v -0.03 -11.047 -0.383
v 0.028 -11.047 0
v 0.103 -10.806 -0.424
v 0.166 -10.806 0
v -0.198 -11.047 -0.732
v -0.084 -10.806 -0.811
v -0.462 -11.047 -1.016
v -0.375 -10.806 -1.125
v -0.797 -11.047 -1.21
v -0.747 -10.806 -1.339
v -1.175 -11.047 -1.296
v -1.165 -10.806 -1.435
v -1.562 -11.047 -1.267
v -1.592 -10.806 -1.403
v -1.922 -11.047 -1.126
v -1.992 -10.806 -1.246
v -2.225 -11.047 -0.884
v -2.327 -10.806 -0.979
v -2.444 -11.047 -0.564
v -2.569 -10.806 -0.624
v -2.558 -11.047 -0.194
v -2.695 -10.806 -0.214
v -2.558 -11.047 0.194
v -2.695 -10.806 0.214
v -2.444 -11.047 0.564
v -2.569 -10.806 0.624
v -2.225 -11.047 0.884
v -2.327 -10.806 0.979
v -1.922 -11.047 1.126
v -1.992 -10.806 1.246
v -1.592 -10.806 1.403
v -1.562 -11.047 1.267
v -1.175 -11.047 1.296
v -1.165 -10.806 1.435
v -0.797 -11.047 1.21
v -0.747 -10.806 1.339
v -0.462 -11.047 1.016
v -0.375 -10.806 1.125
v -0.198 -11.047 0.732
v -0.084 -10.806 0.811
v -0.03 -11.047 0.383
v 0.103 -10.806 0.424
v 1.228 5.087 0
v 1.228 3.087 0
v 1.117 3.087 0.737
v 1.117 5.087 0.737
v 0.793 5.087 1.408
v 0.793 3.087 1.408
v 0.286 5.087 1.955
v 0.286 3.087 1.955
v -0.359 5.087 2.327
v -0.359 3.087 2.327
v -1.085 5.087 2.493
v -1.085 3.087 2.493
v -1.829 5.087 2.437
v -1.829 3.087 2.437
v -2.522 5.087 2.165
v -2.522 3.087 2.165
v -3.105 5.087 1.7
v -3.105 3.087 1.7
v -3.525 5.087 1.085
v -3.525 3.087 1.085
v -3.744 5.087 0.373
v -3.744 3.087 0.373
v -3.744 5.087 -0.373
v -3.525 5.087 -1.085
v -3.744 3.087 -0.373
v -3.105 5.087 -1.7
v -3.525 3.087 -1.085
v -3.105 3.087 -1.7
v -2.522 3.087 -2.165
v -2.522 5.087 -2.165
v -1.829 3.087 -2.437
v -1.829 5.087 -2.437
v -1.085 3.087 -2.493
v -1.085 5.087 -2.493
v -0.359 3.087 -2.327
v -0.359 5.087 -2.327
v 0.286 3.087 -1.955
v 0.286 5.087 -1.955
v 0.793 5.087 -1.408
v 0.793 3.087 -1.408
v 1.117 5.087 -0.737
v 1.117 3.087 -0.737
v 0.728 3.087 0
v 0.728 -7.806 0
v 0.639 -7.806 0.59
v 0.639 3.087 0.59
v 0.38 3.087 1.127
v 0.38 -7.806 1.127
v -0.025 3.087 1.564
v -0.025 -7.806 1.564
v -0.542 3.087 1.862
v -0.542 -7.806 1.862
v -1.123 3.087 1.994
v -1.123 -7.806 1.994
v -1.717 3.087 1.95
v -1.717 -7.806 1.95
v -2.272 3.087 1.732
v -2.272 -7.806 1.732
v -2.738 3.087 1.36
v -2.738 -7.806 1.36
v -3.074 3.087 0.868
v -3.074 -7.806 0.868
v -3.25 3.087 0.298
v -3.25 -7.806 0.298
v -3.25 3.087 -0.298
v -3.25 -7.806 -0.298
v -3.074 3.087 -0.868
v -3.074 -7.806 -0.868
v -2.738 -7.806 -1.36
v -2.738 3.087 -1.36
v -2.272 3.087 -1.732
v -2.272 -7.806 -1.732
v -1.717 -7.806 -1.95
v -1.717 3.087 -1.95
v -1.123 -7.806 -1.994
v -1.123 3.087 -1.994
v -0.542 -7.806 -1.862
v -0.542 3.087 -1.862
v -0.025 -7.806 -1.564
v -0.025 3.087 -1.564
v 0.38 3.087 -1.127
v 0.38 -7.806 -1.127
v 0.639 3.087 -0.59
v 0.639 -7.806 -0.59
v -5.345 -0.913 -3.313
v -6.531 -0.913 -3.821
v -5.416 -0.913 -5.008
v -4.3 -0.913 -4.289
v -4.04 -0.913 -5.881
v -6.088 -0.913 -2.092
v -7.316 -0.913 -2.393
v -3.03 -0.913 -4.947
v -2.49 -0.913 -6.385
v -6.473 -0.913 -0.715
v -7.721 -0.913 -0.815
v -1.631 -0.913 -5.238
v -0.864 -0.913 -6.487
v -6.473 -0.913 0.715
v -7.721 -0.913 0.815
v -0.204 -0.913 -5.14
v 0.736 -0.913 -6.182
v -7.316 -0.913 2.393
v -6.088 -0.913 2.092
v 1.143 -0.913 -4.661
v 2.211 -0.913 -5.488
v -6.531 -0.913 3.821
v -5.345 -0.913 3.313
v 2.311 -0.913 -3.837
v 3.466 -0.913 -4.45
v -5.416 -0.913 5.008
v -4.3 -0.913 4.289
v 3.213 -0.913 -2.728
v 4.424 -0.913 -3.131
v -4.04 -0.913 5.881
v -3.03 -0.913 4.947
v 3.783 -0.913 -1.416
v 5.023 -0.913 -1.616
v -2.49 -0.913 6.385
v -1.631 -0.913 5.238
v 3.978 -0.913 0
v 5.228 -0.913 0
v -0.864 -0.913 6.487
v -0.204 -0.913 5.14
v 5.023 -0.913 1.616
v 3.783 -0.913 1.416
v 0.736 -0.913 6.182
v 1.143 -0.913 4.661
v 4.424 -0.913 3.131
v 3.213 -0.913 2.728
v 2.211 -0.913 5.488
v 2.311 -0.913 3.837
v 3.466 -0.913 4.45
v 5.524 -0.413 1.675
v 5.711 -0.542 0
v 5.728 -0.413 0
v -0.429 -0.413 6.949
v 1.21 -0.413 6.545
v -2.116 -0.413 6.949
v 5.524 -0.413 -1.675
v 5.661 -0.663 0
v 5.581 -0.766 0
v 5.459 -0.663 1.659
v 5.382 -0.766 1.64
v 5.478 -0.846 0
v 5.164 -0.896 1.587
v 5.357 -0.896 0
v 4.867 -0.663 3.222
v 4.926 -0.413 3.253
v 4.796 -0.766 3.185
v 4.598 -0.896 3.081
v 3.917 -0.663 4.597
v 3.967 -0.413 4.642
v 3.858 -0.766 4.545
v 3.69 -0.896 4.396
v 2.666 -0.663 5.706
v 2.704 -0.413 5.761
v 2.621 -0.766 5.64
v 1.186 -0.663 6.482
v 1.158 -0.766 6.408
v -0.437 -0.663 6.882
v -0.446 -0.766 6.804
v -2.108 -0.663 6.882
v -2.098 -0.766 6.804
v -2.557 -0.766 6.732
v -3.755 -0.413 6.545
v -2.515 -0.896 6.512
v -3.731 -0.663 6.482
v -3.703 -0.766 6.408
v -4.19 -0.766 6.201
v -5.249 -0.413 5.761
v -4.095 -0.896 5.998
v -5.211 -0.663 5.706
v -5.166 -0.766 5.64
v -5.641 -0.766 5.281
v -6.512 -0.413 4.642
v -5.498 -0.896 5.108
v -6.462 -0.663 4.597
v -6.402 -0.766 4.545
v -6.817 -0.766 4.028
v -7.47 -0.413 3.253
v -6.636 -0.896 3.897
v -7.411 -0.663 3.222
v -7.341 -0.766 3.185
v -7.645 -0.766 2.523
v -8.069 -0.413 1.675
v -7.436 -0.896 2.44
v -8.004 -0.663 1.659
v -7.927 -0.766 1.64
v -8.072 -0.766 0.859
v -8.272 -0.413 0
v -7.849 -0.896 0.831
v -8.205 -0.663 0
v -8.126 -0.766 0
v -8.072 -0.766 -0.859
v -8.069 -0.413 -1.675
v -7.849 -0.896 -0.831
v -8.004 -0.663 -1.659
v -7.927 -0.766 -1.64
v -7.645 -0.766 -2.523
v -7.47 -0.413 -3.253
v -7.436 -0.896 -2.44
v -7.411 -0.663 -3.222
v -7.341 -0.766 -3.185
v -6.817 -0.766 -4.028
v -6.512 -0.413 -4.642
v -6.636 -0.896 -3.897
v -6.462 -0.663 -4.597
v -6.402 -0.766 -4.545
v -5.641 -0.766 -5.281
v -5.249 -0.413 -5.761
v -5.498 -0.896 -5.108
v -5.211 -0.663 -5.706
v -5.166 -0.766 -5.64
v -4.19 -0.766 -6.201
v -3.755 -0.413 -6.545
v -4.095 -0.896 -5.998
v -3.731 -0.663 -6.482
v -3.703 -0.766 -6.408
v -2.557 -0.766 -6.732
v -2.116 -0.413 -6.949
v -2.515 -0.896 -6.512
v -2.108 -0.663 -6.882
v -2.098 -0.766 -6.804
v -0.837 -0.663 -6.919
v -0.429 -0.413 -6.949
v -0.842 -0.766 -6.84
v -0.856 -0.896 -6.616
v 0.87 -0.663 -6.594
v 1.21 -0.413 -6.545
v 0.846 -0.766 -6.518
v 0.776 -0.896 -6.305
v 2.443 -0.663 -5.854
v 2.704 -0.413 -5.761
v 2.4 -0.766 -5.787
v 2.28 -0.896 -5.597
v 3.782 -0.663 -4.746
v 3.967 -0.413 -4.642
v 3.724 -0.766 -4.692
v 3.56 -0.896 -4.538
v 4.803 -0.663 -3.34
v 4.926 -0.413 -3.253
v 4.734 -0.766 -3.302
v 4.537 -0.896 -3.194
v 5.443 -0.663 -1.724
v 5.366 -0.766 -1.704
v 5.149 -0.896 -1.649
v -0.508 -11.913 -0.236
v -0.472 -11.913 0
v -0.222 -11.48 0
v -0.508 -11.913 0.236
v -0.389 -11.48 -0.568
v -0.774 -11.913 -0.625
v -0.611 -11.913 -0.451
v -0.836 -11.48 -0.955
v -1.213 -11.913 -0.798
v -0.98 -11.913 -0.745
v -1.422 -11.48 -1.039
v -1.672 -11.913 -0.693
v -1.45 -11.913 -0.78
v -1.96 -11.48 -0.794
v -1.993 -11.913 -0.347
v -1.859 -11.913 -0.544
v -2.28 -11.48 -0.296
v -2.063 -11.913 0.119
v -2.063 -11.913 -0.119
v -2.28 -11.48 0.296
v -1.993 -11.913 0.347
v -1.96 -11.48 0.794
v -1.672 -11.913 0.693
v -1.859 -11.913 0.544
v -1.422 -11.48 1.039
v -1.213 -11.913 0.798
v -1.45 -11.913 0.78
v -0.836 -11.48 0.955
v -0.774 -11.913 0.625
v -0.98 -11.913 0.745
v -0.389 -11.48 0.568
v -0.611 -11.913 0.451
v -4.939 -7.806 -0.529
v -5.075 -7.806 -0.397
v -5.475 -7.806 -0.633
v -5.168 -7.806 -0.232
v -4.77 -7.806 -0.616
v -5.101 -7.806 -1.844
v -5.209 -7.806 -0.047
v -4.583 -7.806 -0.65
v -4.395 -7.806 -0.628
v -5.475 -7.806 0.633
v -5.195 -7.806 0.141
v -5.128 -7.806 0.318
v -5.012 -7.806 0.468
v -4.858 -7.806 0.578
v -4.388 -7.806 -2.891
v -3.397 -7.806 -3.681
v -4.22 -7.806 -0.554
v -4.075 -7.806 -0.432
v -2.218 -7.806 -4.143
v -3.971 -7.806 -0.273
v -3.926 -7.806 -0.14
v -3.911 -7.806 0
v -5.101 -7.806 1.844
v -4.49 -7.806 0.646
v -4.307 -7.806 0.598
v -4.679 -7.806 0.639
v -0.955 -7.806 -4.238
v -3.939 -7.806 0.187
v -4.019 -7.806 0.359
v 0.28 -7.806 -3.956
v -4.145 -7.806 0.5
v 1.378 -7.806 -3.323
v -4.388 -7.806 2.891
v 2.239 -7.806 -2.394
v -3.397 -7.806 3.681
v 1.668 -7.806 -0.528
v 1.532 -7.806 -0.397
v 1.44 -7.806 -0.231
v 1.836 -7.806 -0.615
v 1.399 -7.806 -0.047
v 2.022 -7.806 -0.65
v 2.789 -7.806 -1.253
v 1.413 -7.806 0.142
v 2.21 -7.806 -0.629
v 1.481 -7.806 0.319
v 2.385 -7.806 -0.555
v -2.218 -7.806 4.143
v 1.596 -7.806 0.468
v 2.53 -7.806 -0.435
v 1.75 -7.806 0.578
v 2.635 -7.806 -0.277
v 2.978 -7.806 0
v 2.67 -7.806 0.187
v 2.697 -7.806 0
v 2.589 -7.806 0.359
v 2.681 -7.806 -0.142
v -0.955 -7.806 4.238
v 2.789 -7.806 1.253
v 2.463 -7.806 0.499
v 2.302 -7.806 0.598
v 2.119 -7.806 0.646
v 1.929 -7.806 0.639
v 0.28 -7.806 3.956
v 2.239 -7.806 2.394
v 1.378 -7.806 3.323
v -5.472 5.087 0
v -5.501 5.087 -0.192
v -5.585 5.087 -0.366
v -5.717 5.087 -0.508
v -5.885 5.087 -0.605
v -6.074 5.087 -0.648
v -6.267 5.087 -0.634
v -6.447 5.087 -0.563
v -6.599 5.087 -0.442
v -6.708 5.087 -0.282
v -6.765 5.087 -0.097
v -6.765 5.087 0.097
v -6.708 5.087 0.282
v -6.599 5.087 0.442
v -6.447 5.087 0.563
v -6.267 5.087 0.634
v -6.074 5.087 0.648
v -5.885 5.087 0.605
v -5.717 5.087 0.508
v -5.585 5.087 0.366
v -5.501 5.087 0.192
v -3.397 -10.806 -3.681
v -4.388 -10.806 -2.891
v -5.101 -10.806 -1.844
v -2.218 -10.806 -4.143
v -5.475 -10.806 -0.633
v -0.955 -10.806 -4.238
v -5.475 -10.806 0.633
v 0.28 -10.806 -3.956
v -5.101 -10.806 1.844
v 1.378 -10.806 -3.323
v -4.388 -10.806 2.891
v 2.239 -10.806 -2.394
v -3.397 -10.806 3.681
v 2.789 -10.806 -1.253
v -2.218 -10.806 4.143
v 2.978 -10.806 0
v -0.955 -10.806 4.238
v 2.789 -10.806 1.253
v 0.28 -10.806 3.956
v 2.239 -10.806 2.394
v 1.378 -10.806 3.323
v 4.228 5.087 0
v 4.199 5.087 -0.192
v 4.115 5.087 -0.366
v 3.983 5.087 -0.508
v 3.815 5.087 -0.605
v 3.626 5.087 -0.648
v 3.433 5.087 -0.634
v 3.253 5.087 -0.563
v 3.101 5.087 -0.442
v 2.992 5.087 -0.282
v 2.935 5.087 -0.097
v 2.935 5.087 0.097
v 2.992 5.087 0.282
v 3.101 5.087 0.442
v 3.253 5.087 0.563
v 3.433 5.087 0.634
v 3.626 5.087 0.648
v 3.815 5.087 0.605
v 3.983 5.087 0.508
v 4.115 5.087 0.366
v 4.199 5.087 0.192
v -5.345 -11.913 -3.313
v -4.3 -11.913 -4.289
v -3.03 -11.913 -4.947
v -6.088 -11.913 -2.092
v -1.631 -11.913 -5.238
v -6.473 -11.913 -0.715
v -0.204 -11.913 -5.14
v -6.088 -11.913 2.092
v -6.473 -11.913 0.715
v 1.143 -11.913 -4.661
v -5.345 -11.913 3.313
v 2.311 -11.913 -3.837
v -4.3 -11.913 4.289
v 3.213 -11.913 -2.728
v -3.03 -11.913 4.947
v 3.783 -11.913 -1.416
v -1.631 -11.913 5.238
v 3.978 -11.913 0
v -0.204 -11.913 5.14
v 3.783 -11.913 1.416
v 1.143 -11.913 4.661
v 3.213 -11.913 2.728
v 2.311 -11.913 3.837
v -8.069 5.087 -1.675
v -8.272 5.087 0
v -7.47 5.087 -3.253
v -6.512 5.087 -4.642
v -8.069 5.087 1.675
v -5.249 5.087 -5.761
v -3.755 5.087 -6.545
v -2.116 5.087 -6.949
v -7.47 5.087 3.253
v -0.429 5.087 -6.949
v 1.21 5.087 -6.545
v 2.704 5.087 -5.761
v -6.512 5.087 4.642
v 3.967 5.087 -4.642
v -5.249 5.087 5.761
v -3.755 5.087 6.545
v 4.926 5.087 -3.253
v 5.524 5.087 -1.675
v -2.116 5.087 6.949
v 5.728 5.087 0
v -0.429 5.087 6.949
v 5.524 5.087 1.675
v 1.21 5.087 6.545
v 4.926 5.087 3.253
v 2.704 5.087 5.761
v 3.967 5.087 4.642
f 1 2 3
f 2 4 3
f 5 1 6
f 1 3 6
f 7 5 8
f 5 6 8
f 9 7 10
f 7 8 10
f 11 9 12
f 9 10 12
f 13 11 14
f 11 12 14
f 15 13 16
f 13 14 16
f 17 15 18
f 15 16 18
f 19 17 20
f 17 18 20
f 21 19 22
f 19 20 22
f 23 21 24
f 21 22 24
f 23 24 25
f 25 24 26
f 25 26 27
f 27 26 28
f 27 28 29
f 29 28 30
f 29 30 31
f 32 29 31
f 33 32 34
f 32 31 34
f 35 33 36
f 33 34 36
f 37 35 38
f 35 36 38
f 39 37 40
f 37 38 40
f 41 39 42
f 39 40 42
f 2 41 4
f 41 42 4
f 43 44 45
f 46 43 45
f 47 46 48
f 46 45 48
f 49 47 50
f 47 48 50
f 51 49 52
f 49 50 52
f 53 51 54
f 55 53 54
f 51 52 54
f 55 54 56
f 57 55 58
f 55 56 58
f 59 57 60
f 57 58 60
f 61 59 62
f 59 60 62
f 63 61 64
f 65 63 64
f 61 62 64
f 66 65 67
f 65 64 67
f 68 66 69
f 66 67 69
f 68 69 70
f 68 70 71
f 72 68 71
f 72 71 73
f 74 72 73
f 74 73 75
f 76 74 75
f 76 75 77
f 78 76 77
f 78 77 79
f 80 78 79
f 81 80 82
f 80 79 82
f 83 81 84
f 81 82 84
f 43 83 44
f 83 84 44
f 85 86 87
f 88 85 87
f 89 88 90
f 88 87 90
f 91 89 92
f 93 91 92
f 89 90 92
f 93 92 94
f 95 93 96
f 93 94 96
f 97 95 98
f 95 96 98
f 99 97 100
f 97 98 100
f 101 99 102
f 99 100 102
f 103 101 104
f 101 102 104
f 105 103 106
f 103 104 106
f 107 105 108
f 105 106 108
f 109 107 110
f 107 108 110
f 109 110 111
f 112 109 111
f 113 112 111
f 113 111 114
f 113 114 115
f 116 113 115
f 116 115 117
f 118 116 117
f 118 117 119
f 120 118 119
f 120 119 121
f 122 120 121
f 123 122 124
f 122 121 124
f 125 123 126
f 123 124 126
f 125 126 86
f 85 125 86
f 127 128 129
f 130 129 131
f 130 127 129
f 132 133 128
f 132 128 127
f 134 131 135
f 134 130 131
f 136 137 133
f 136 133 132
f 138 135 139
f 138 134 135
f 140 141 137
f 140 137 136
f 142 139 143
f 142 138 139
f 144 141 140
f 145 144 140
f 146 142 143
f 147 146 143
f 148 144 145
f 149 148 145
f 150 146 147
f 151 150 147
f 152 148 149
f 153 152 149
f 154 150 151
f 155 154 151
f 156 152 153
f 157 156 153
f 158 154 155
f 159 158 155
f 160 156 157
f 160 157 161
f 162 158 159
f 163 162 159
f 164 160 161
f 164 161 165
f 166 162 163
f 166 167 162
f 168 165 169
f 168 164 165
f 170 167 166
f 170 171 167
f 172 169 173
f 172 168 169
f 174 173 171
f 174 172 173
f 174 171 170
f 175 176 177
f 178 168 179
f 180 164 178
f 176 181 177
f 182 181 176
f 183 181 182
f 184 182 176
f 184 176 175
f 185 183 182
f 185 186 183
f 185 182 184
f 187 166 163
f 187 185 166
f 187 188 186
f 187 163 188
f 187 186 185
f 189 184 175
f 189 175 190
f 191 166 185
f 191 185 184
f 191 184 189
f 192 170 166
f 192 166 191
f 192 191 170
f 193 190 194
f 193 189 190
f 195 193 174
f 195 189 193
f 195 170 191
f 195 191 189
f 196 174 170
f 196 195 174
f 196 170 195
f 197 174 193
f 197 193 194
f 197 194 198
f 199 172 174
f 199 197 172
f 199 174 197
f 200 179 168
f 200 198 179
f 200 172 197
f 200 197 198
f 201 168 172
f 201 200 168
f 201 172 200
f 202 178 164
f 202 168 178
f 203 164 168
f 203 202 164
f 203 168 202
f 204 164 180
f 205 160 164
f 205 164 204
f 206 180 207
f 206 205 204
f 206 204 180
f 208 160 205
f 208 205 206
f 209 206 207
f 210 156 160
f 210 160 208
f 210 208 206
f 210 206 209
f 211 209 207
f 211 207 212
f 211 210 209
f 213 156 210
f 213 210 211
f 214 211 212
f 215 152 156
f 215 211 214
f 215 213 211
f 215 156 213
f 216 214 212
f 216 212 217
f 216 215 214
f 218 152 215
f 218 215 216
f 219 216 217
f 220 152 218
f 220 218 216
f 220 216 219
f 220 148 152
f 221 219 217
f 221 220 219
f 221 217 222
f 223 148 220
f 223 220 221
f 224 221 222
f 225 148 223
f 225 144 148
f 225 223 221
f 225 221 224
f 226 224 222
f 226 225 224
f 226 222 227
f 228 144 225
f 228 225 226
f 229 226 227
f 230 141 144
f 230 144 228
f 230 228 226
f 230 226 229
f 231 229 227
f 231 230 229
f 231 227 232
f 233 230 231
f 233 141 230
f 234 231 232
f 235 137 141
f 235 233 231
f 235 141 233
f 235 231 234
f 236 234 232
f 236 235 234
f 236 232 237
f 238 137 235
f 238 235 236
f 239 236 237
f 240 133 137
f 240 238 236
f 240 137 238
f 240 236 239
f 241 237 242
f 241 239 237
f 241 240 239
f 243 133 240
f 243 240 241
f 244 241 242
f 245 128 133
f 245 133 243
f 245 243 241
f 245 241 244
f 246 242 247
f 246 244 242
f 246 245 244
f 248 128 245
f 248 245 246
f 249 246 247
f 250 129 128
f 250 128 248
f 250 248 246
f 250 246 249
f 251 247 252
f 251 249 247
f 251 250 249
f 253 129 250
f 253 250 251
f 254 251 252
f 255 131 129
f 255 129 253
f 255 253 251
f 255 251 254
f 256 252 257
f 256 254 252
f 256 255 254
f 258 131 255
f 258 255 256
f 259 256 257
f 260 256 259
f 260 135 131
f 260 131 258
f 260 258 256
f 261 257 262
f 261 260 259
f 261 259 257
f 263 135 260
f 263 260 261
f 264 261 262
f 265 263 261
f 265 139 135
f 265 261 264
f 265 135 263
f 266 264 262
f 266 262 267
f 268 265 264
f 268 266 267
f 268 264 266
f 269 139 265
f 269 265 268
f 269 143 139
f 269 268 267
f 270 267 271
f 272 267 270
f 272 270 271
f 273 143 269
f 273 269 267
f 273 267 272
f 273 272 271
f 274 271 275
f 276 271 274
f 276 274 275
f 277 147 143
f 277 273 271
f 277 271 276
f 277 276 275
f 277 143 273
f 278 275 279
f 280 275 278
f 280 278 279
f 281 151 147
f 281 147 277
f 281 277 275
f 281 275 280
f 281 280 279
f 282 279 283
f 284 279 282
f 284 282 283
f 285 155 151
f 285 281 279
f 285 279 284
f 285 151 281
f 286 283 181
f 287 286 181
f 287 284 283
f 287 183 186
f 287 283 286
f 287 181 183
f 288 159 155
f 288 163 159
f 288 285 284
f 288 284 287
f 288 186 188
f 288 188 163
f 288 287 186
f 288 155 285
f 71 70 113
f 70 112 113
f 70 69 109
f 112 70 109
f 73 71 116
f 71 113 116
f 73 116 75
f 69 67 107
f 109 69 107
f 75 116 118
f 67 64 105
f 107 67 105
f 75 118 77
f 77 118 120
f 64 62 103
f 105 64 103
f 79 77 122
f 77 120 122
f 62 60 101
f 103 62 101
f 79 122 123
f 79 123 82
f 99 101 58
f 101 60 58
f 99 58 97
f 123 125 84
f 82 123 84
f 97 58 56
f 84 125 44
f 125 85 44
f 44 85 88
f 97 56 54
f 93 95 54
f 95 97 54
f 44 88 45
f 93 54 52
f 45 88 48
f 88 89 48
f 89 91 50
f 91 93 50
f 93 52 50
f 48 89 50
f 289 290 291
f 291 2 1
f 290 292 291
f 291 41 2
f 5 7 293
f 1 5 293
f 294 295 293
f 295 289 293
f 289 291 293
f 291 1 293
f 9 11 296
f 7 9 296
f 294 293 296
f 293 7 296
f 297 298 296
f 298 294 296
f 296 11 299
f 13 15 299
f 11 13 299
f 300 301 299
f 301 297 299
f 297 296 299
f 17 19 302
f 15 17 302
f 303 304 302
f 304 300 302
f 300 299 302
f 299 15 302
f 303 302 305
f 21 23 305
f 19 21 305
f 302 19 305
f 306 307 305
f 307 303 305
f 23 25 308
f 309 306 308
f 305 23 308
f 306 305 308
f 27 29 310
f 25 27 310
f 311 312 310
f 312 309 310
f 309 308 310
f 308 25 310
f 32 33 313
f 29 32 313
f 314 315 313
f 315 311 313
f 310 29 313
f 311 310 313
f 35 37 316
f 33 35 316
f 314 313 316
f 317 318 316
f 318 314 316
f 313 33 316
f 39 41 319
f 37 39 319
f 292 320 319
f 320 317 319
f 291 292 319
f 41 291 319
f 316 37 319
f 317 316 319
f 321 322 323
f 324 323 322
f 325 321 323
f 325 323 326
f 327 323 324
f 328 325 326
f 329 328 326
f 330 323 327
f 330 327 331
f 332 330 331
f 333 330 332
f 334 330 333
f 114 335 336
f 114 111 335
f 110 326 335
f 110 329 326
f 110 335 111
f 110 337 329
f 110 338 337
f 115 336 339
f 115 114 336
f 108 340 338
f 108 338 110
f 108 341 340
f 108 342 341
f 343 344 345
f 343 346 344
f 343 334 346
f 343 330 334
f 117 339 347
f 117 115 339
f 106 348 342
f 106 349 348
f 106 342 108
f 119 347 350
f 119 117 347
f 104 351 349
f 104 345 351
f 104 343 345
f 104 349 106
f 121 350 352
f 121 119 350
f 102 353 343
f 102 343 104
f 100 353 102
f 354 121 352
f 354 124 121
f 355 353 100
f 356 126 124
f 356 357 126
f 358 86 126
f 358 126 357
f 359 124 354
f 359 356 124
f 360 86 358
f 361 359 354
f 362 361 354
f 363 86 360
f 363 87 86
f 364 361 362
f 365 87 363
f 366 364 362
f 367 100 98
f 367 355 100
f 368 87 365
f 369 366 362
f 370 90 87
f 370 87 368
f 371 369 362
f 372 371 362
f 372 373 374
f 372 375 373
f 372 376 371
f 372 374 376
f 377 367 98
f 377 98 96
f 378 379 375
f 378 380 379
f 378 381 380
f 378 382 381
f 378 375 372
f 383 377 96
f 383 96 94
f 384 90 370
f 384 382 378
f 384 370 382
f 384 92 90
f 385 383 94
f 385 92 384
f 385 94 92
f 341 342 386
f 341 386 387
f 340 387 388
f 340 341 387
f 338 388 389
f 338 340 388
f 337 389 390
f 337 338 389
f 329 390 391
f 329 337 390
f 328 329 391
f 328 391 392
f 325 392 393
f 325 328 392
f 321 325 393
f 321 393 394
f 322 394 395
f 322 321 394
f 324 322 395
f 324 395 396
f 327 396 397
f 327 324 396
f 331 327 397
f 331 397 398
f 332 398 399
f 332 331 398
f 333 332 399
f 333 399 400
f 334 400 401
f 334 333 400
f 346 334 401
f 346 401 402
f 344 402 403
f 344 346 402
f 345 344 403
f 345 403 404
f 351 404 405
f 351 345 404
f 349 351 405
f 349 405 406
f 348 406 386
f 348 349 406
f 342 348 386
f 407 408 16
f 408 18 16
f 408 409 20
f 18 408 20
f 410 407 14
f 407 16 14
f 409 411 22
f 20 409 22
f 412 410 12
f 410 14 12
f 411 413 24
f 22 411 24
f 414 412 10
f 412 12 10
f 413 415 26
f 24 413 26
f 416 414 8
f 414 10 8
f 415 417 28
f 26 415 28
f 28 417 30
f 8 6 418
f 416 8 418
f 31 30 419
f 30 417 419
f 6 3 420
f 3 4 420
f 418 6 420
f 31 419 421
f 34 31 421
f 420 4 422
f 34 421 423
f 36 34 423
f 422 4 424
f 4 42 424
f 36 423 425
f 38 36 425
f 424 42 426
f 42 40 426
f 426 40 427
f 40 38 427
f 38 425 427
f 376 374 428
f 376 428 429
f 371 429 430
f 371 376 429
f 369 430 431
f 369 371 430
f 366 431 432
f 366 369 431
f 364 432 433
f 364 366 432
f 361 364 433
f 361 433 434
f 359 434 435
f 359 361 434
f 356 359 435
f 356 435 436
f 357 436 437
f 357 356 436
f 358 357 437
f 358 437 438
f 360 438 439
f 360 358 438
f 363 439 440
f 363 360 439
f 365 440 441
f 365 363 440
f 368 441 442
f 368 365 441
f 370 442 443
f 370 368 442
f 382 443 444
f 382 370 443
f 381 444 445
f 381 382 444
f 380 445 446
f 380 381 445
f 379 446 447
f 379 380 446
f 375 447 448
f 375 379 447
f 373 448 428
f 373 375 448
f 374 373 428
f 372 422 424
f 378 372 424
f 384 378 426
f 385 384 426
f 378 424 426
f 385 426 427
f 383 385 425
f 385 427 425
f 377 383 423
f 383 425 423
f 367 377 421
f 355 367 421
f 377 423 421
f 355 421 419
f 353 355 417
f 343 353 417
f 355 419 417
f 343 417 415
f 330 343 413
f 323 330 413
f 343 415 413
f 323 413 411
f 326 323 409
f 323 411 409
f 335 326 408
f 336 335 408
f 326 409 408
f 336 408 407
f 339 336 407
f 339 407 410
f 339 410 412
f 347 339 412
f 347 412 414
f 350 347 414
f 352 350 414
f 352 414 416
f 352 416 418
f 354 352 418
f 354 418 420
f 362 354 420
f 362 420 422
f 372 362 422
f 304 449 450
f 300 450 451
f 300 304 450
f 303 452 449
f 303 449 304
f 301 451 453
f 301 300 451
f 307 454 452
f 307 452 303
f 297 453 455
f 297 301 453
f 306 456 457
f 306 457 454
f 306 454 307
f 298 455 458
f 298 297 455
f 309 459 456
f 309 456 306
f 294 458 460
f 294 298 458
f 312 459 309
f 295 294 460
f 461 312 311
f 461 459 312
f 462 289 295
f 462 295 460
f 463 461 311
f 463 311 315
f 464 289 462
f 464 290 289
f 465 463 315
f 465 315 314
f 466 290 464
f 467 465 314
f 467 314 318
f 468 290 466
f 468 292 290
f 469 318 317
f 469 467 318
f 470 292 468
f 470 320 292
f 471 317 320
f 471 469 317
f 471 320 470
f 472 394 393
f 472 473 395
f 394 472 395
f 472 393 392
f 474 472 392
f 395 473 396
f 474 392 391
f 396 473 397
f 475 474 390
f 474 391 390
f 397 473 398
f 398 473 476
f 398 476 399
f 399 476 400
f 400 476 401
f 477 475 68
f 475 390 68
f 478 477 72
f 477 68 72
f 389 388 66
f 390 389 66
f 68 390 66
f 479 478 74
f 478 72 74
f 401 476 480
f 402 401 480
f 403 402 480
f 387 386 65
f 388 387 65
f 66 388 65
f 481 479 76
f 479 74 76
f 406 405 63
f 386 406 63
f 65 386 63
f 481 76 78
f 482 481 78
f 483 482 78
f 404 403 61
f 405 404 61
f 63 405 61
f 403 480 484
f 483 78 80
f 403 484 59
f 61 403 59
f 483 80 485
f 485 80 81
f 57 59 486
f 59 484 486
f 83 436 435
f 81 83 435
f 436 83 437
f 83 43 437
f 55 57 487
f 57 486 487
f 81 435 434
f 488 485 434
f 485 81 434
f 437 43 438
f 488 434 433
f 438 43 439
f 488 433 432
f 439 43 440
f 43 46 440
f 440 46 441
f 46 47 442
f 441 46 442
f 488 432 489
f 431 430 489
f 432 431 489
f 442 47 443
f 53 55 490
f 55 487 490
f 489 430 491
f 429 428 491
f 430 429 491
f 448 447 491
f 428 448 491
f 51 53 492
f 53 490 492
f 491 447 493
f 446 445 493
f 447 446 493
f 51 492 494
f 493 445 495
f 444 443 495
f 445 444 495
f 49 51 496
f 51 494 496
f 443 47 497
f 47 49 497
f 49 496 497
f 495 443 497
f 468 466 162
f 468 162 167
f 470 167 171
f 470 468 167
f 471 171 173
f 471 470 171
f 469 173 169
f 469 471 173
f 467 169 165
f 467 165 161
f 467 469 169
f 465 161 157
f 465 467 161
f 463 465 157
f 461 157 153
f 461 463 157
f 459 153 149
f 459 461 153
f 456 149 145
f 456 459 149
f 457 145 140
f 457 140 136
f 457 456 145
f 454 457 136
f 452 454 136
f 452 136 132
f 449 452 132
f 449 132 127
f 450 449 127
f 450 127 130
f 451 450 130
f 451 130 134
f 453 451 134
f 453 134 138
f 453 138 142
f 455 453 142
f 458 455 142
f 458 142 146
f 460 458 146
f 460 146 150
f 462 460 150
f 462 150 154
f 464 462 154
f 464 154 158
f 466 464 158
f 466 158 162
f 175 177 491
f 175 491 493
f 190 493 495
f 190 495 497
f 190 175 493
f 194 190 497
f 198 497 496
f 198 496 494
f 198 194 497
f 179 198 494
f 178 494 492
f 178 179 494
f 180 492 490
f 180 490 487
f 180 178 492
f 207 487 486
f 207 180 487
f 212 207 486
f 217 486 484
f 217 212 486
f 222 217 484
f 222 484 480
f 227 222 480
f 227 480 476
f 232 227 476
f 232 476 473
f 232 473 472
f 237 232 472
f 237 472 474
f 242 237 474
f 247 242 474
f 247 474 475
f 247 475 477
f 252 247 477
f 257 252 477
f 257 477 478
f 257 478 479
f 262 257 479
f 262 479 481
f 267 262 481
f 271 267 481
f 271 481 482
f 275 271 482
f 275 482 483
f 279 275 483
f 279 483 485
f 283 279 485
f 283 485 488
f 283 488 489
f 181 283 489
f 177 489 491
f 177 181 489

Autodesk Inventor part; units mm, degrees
ref_plane "YZ Plane" through (0, 0, 0) normal (1, 0, 0) x (0, 1, 0)
ref_plane "XZ Plane" through (0, 0, 0) normal (0, 1, 0) x (-1, 0, 0)
ref_plane "XY Plane" through (0, 0, 0) normal (0, 0, 1) x (1, 0, 0)
sketch "Sketch1" plane through (0, 0, 0) normal (0, 0, 1) x (1, 0, 0)
  line L0 (-1.2723, 5.8241) -> (-1.2723, -4.8856)
  line L1 (1.2277, 5.0871) -> (1.2277, 3.0871)
  line L2 (5.7277, 5.0871) -> (5.7277, -0.9129)
  line L3 (3.9777, -0.9129) -> (3.9777, -11.9129)
  line L4 (1.2277, 5.0871) -> (5.7277, 5.0871)
  line L5 (5.7277, -0.9129) -> (3.9777, -0.9129)
  line L6 (0.7277, 3.0871) -> (0.7277, -7.8065)
  line L7 (1.2277, 3.0871) -> (0.7277, 3.0871)
  line L8 (0.7277, -7.8065) -> (2.9777, -7.8065)
  line L9 (2.9777, -7.8065) -> (2.9777, -10.8065)
  line L10 (0.0277, -11.0469) -> (-0.4723, -11.9129)
  line L11 (-0.4723, -11.9129) -> (3.9777, -11.9129)
  line L12 (2.9777, -10.8065) -> (0.1665, -10.8065)
  line L13 (0.1665, -10.8065) -> (0.0277, -11.0469)
  point P0 (0, 0)
  dimension "d0" = 5
  dimension "d1" = 6
  dimension "d2" = 14
  dimension "d3" = 11
  dimension "d4" = 2
  dimension "d5" = 4
  dimension "d6" = 10.5
  dimension "d7" = 3
  dimension "d8" = 8.5
  dimension "d11" = 0.8
revolve "Revolution1" add sketch "Sketch1" angle 360 about axis through (-1.2723, 5.8241, 0) along (0, -1, 0)
fillet "Fillet1" radius 0.5 1 edges at (-8.2723, -0.9129, 0)
sketch "Sketch4" plane through (-1.2723, 5.0871, 0) normal (0, 1, 0) x (1, 0, 0)
  circle A0 centre (-4.85, 0) radius 0.65
  circle A1 centre (4.85, 0) radius 0.65
  circle A2 centre (0, 0) radius 7 projected
  point P0 (1.2723, 0)
  dimension "d25" = 1.3
  dimension "d26" = 1.3
  dimension "d28" = 1.5
  dimension "d29" = 1.5
  dimension "d30" = 11
sketch "Sketch5" plane through (0, 0, 0) normal (0, 0, 1) x (1, 0, 0)
  line L0 (-8.2723, 5.0871) -> (5.7277, 5.0871) projected
  line L1 (3.5777, 5.0871) -> (1.9777, -8.3912)
  line L2 (-8.2723, 5.0871) -> (-8.2723, -0.4129) projected
  line L3 (5.7277, 5.0871) -> (5.7277, -0.4129) projected
  line L4 (-6.1223, 5.0871) -> (-4.5223, -8.3912)
  line L5 (-5.5223, -10.8065) -> (-5.5223, -7.8065) projected
  line L6 (2.9777, -10.8065) -> (2.9777, -7.8065) projected
  point P0 (0, 0)
  dimension "d31" = 2.15
  dimension "d32" = 2.15
  dimension "d33" = 1
  dimension "d34" = 1
sweep "Sweep2" cut profiles "Sketch4" path "Sketch5" path curves L1 contours A1
sketch "Sketch6" plane through (-1.2723, 5.0871, 0) normal (0, 1, 0) x (1, 0, 0)
  circle A0 centre (-4.85, 0) radius 0.65
  circle A1 centre (0, 0) radius 7 projected
  circle A2 centre (4.85, 0) radius 0.65 projected
  point P0 (1.2723, 0)
  dimension "d37" = 1.3
  dimension "d38" = 11
sketch "Sketch7" plane through (0, 0, 0) normal (0, 0, 1) x (1, 0, 0)
  line L0 (-8.2723, 5.0871) -> (5.7277, 5.0871) projected
  line L1 (-6.1223, 5.0871) -> (-4.5223, -8.1262)
  line L2 (-5.5223, -10.8065) -> (2.9777, -10.8065) projected
  line L3 (-5.5223, -7.8065) -> (2.9777, -7.8065) projected
  line L4 (-5.5223, -10.8065) -> (-5.5223, -7.8065) projected
  line L5 (-8.2723, 5.0871) -> (-8.2723, -0.4129) projected
  point P0 (0, 0)
  dimension "d39" = 1
  dimension "d40" = 2.15
sweep "Sweep3" cut profiles "Sketch6" path "Sketch7" path curves L1 contours A0
properties part number "Musab4" material "Steel, Alloy"
